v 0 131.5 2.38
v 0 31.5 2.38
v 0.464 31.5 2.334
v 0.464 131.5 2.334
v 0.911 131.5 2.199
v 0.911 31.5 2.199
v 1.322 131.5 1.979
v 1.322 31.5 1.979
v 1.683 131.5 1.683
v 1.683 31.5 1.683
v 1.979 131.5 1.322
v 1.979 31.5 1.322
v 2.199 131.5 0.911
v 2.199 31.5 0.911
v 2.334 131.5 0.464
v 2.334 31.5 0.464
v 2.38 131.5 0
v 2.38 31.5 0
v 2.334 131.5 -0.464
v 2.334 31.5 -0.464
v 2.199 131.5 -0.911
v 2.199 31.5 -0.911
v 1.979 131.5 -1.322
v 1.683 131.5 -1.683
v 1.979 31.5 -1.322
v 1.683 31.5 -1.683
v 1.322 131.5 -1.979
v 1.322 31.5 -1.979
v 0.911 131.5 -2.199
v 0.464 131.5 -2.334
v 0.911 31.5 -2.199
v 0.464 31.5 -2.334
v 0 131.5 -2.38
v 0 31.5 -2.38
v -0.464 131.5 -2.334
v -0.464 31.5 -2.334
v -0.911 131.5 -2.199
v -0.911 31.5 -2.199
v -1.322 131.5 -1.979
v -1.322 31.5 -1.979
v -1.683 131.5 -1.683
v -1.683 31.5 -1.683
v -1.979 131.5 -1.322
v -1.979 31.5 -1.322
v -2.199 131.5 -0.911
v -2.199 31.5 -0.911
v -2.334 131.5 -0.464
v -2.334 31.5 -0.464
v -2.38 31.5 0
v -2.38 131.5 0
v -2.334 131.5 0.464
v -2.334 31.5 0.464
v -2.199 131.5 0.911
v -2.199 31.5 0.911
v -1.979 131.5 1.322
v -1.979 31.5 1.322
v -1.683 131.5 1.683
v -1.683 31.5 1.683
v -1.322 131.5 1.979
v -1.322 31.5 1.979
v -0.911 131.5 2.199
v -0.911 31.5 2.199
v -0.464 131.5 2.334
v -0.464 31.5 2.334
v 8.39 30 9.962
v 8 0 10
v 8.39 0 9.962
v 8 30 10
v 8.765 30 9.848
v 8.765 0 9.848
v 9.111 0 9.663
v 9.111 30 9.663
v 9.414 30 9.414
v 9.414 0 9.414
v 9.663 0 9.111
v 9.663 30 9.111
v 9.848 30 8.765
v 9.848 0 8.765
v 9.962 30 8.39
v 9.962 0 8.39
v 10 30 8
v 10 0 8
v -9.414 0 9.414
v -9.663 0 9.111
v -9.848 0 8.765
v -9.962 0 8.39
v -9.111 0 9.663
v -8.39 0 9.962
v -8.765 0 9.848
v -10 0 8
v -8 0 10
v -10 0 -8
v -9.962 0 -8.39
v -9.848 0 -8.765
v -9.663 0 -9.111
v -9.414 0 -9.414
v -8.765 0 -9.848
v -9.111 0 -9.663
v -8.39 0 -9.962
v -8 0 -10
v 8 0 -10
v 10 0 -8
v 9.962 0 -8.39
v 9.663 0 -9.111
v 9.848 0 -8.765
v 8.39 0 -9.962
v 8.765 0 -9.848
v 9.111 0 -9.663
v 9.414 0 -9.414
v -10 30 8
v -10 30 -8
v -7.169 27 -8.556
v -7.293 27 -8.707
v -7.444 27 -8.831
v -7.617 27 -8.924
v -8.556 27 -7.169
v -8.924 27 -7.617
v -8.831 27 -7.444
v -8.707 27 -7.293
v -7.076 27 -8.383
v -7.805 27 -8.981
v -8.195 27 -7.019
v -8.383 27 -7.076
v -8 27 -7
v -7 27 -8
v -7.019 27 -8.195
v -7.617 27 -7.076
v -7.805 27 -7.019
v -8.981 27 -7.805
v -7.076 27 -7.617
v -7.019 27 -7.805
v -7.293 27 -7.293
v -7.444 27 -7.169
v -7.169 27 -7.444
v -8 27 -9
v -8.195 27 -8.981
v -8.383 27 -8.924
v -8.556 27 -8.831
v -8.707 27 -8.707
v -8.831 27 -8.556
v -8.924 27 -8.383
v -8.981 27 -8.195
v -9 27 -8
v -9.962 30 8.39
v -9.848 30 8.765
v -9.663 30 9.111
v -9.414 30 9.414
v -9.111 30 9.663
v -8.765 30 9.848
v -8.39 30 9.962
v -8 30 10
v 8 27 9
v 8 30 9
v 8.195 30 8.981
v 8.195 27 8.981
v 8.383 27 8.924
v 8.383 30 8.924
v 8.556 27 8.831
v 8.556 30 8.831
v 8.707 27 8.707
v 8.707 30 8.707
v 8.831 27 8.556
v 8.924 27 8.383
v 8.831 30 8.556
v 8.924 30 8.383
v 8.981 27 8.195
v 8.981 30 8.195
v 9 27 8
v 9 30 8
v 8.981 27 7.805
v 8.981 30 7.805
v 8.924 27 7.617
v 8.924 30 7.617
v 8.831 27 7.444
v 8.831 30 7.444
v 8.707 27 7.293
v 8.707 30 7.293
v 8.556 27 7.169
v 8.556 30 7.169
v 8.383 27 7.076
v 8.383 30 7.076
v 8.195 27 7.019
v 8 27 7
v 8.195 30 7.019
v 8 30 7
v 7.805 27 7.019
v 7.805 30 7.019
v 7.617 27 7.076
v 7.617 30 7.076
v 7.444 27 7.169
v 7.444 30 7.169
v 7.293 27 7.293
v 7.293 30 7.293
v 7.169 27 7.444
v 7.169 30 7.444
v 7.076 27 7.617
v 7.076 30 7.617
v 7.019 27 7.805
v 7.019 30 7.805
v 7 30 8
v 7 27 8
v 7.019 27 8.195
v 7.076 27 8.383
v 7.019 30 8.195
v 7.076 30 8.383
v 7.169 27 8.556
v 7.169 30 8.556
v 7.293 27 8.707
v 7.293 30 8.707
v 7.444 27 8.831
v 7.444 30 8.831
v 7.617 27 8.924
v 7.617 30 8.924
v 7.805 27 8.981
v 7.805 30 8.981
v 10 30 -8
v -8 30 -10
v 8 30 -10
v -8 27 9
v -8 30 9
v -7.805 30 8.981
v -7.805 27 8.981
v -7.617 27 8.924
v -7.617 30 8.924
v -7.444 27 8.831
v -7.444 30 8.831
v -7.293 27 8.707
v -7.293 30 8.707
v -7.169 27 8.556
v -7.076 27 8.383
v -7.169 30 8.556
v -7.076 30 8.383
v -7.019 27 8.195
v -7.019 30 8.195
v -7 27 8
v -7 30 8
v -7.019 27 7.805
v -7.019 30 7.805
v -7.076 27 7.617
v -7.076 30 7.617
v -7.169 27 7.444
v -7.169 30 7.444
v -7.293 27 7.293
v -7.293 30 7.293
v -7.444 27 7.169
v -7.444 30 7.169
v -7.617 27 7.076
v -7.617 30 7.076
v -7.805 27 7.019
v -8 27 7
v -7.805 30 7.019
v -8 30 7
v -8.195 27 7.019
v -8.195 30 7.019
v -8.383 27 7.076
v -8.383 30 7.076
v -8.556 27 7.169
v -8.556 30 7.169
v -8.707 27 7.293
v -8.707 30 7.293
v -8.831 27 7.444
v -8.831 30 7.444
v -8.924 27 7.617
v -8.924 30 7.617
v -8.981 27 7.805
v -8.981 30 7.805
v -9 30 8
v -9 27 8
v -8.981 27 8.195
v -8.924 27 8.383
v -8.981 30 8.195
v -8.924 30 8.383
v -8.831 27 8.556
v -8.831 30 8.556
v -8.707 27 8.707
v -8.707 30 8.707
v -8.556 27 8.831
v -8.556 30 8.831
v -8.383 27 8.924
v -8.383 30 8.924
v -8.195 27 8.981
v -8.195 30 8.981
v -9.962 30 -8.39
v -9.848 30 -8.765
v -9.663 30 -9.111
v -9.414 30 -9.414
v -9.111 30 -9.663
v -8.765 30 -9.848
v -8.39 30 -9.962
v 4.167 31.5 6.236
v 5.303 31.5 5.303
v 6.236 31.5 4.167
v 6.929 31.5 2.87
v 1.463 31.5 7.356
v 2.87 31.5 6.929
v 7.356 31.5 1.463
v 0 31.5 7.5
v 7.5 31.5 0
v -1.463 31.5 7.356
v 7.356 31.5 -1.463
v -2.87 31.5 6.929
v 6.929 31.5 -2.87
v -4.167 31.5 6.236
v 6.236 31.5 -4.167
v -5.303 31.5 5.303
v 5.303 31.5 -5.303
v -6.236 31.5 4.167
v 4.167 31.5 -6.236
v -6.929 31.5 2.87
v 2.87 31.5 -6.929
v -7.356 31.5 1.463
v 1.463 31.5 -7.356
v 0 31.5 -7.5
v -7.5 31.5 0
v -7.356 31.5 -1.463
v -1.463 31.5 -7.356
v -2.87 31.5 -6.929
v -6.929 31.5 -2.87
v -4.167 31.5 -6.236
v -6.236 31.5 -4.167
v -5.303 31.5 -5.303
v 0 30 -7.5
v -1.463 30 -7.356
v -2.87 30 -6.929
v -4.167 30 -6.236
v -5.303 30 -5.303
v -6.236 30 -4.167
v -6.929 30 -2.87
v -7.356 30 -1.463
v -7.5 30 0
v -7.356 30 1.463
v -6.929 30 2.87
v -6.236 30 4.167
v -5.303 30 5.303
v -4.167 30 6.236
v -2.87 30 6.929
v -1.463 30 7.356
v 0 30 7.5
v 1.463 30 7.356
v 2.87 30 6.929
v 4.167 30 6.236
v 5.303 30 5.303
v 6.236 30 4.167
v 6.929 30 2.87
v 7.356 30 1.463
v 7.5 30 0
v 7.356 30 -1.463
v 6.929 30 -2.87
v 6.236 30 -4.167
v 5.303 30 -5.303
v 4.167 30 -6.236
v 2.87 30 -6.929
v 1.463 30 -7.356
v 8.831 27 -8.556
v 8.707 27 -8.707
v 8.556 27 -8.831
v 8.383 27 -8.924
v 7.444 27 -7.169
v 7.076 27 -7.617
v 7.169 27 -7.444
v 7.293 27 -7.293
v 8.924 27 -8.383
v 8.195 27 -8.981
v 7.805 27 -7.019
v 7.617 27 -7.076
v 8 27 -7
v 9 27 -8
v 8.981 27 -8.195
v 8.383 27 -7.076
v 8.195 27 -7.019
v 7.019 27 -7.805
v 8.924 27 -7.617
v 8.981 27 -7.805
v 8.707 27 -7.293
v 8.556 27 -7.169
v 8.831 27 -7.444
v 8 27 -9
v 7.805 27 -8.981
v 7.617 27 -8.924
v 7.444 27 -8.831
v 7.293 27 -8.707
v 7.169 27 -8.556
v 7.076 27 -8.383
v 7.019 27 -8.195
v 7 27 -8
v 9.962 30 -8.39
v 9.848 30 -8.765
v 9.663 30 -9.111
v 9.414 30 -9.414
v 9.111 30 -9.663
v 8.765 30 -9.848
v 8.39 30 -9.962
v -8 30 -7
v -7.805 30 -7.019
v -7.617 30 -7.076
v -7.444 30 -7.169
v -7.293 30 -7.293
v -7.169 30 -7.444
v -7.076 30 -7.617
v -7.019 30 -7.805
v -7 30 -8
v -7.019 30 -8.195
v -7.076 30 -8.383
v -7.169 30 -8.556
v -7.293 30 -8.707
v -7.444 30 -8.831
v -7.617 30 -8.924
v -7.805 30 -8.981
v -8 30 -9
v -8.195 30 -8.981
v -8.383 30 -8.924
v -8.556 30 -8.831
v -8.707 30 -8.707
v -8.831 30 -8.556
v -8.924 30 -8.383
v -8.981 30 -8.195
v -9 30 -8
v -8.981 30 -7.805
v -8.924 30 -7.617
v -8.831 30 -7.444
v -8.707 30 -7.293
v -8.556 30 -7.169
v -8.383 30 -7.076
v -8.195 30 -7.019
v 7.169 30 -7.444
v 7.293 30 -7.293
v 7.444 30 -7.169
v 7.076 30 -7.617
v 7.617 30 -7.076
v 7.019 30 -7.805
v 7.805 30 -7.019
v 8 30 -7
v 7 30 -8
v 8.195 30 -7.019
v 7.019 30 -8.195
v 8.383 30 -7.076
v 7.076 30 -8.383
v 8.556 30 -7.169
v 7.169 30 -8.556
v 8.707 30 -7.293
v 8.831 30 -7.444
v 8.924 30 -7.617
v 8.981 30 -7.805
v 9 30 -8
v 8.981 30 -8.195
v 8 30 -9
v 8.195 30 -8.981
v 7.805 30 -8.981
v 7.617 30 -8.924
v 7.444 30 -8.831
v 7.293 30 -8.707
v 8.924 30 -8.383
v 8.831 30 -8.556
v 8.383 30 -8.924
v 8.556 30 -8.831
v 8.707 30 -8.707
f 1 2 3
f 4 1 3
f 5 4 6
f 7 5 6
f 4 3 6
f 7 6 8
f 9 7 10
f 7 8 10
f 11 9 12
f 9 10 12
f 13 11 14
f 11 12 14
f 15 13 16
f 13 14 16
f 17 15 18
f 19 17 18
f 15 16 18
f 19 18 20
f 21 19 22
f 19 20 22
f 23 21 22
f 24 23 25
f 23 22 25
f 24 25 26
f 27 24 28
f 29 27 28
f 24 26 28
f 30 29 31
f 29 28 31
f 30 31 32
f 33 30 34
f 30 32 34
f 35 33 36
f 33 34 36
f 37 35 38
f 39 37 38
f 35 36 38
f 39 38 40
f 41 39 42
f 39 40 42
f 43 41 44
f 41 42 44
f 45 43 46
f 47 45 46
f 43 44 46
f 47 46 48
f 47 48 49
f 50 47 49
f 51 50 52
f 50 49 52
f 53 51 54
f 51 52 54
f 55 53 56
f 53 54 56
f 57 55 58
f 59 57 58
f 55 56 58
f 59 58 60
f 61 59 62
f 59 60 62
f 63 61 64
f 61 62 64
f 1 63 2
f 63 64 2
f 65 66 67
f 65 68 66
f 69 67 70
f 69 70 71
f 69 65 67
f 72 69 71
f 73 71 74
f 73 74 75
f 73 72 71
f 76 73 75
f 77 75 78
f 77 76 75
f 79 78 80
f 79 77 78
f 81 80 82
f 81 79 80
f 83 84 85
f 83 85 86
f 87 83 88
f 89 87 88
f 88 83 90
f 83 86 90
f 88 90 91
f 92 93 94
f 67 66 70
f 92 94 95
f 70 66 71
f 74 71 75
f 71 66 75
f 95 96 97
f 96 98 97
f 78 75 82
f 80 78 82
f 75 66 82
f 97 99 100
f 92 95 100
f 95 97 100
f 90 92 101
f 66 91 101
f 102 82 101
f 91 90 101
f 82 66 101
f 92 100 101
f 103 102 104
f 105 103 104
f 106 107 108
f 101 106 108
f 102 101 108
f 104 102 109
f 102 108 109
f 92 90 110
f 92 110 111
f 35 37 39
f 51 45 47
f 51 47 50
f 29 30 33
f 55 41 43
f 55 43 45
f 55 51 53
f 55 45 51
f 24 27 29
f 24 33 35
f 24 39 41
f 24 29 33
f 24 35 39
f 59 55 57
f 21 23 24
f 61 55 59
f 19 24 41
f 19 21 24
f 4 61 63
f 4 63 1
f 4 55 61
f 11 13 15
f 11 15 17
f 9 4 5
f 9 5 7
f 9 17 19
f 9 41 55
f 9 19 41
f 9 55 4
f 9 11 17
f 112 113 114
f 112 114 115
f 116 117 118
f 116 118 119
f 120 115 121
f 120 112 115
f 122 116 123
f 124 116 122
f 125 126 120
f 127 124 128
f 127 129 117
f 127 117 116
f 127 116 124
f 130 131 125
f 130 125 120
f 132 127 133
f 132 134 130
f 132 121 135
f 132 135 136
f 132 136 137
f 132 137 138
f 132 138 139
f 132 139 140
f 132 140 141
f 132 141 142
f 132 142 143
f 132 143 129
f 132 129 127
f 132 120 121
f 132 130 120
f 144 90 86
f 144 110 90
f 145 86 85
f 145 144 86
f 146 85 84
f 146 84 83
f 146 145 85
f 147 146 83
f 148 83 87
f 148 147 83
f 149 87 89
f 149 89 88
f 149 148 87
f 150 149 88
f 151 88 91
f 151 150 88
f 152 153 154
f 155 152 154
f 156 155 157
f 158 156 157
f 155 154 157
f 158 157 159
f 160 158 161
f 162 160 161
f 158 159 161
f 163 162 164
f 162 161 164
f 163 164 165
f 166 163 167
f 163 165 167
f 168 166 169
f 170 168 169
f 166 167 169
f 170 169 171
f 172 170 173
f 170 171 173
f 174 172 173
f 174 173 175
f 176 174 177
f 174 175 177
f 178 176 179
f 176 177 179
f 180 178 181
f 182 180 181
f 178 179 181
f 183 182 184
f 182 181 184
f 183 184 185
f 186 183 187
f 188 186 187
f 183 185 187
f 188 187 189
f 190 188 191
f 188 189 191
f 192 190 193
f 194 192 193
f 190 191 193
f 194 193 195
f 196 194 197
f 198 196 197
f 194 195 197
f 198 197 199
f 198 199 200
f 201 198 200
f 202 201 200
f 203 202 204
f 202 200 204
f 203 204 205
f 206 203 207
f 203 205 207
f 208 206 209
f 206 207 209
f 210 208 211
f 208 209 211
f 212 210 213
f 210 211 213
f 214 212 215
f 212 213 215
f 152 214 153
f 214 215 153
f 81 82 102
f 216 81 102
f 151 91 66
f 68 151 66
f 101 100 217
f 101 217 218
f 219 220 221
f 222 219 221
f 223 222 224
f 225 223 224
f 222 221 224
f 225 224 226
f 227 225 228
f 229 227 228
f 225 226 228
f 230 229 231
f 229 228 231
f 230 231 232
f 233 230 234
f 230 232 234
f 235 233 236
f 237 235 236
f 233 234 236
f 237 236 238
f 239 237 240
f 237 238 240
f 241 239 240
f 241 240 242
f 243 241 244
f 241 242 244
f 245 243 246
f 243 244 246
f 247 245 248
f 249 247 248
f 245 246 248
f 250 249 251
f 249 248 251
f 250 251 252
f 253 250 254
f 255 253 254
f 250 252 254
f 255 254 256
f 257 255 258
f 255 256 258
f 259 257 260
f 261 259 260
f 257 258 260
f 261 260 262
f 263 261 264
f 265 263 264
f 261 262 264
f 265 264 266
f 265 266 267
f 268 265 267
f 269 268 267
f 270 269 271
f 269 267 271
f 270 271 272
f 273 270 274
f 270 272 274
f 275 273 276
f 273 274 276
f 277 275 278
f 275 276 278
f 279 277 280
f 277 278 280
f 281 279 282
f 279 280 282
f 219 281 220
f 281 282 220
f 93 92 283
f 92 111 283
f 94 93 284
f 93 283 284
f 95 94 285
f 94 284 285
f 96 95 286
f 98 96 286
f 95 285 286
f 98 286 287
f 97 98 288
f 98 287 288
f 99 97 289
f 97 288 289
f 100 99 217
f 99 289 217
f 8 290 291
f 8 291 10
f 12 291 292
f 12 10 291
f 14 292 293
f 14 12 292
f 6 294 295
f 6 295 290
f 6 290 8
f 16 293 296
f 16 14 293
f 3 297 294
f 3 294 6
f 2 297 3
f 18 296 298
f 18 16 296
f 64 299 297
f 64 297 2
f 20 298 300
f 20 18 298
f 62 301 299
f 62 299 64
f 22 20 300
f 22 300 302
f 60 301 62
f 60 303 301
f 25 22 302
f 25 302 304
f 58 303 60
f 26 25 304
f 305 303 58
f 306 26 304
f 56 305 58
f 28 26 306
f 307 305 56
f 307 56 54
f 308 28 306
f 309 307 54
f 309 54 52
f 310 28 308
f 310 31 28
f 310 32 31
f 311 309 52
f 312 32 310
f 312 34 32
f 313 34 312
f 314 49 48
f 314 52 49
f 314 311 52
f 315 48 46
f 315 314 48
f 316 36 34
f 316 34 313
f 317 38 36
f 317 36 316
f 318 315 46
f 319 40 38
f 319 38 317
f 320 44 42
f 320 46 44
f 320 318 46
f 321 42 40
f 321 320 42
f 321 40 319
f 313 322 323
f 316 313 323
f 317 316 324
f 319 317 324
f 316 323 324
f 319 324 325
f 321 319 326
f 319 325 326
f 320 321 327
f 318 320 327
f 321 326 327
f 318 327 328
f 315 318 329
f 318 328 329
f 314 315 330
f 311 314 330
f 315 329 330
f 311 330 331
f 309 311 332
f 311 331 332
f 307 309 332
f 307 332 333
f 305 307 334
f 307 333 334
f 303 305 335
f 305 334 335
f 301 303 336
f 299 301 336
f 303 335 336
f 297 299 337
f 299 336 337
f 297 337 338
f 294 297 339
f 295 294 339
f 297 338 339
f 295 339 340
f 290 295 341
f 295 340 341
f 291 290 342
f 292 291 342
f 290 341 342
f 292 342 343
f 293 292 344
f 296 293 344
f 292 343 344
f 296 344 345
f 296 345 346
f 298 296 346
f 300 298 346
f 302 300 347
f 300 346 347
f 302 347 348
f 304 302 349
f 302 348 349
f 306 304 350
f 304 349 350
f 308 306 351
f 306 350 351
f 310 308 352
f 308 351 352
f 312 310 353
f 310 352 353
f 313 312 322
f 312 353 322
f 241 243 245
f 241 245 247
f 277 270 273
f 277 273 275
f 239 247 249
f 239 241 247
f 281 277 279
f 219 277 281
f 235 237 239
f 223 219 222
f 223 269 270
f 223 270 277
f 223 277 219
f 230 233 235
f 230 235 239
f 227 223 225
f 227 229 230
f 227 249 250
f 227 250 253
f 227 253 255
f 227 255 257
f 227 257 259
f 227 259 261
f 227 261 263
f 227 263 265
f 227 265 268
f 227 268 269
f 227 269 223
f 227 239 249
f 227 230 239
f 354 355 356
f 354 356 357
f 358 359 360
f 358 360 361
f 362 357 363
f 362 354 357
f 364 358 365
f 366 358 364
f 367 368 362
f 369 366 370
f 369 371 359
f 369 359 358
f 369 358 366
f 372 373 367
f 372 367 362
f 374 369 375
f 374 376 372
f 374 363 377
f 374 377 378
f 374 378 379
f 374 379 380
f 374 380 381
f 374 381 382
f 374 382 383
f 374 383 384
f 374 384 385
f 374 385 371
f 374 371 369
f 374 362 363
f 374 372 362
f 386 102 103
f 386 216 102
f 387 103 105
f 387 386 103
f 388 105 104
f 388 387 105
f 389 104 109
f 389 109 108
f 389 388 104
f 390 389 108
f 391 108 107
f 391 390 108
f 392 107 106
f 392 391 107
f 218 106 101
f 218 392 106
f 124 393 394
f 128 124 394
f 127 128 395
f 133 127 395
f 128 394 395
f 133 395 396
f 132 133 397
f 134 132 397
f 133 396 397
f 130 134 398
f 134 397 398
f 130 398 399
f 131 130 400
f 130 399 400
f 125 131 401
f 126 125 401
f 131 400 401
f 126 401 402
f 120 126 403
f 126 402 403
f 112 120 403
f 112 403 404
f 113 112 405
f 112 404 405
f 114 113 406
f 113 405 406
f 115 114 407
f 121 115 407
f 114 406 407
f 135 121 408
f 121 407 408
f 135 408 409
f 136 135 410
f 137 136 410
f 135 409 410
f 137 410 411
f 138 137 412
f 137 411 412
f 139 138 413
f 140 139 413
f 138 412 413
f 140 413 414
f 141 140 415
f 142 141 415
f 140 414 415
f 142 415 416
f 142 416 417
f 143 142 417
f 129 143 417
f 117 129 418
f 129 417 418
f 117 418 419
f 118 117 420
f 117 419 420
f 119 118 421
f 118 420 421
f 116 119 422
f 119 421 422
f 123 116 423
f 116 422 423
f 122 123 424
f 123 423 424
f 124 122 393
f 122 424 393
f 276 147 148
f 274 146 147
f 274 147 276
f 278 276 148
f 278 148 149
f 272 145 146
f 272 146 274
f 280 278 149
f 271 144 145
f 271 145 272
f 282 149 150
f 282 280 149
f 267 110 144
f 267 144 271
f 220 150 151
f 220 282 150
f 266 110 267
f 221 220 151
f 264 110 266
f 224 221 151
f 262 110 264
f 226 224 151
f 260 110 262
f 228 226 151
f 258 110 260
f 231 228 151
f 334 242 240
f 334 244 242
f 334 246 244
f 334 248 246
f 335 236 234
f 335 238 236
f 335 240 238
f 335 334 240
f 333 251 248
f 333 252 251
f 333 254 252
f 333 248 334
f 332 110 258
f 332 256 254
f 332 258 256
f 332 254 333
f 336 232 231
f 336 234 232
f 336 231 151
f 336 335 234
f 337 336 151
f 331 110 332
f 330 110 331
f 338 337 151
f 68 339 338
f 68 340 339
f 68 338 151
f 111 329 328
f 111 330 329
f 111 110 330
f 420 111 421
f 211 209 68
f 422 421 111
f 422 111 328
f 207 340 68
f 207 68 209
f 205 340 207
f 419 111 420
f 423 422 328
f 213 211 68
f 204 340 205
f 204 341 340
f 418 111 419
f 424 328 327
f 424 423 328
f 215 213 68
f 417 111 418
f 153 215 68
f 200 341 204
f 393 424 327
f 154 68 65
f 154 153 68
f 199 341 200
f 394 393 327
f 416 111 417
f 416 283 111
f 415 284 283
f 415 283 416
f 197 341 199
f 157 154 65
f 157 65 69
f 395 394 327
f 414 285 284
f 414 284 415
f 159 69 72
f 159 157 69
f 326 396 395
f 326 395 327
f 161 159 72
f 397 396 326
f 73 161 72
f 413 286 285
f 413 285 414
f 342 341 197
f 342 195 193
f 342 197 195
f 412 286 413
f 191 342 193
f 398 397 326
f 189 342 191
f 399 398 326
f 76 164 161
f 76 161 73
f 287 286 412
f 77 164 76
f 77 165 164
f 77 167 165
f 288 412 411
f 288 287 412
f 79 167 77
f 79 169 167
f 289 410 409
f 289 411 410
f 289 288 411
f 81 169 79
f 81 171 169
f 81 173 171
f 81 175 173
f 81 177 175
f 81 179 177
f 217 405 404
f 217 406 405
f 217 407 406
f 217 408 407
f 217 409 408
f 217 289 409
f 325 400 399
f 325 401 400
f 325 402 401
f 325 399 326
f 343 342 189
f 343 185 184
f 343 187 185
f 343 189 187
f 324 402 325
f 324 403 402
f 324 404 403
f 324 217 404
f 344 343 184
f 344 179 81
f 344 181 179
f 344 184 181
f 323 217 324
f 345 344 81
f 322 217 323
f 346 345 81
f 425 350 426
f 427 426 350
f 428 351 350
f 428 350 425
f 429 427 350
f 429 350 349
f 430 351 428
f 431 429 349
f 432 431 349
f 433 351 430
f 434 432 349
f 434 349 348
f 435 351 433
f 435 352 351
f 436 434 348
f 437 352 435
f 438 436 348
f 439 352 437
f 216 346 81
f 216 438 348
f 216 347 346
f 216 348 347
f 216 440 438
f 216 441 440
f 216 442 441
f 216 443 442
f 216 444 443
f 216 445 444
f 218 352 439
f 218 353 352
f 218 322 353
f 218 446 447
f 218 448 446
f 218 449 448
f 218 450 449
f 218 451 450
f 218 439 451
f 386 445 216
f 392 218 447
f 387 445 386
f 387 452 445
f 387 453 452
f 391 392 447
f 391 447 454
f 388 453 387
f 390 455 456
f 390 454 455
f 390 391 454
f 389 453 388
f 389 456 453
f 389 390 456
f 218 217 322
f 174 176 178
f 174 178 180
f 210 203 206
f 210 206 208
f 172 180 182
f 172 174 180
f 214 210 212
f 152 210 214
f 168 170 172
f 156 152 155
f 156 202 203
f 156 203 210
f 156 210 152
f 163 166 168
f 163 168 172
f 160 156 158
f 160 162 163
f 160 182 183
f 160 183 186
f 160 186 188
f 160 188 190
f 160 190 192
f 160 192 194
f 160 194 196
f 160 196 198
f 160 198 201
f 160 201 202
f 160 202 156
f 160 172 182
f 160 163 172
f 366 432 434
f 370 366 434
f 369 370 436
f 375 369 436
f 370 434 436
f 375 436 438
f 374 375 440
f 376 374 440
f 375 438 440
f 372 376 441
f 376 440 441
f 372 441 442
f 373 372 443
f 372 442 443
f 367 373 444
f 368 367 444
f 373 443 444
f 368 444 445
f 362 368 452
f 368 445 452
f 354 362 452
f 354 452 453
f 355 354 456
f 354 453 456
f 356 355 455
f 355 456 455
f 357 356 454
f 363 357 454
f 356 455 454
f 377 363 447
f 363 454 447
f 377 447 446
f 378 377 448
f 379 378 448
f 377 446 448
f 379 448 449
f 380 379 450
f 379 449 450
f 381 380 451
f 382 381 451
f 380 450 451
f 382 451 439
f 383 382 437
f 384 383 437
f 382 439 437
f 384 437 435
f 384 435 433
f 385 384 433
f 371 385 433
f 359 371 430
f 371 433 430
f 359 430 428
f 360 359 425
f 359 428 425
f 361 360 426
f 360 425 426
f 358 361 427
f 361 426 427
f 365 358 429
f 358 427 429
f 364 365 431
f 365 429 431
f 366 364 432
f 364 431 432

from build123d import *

# Parameters (mm, degrees)
SKETCH1_W           = 20
SKETCH1_H           = 20
BOSS_EXTRUDE1_DEPTH = 30
FILLET1_R           = 2
SKETCH2_R           = 1
CUT_EXTRUDE1_DEPTH  = 3
SKETCH3_R           = 7.5
BOSS_EXTRUDE2_DEPTH = 1.5
SKETCH4_R           = 2.38
BOSS_EXTRUDE3_DEPTH = 100


with BuildPart() as part:
    # Sketch1 → Boss-Extrude1 (new body)
    with BuildSketch(Plane(origin=(0, 0, 0), x_dir=(1, 0, 0), z_dir=(0, 1, 0))):
        Rectangle(SKETCH1_W, SKETCH1_H)
    extrude(amount=BOSS_EXTRUDE1_DEPTH)

    # Fillet1
    fillet1_edges = [part.edges().sort_by_distance(p)[0] for p in [
        (10, 15, 10),
        (-10, 15, 10),
        (-10, 15, -10),
        (10, 15, -10),
    ]]
    fillet(fillet1_edges, radius=FILLET1_R)

    # Sketch2 → Cut-Extrude1 (cut)
    with BuildSketch(Plane(origin=(0, 30, 0), x_dir=(1, 0, 0), z_dir=(0, 1, 0))):
        with Locations(Location((-8, 8, 0), (0, 0, 270))):
            Circle(SKETCH2_R)
        with Locations(Location((8, 8, 0), (0, 0, 270))):
            Circle(SKETCH2_R)
        with Locations(Location((8, -8, 0), (0, 0, 270))):
            Circle(SKETCH2_R)
        with Locations(Location((-8, -8, 0), (0, 0, 270))):
            Circle(SKETCH2_R)
    extrude(amount=-CUT_EXTRUDE1_DEPTH, mode=Mode.SUBTRACT)

    # Sketch3 → Boss-Extrude2 (add)
    with BuildSketch(Plane(origin=(0, 30, 0), x_dir=(1, 0, 0), z_dir=(0, 1, 0))):
        with Locations(Location((0, 0, 0), (0, 0, 90))):
            Circle(SKETCH3_R)
    extrude(amount=BOSS_EXTRUDE2_DEPTH)

    # Sketch4 → Boss-Extrude3 (add)
    with BuildSketch(Plane(origin=(0, 31.5, 0), x_dir=(1, 0, 0), z_dir=(0, 1, 0))):
        with Locations(Location((0, 0, 0), (0, 0, 270))):
            Circle(SKETCH4_R)
    extrude(amount=BOSS_EXTRUDE3_DEPTH)


solid = part.part
